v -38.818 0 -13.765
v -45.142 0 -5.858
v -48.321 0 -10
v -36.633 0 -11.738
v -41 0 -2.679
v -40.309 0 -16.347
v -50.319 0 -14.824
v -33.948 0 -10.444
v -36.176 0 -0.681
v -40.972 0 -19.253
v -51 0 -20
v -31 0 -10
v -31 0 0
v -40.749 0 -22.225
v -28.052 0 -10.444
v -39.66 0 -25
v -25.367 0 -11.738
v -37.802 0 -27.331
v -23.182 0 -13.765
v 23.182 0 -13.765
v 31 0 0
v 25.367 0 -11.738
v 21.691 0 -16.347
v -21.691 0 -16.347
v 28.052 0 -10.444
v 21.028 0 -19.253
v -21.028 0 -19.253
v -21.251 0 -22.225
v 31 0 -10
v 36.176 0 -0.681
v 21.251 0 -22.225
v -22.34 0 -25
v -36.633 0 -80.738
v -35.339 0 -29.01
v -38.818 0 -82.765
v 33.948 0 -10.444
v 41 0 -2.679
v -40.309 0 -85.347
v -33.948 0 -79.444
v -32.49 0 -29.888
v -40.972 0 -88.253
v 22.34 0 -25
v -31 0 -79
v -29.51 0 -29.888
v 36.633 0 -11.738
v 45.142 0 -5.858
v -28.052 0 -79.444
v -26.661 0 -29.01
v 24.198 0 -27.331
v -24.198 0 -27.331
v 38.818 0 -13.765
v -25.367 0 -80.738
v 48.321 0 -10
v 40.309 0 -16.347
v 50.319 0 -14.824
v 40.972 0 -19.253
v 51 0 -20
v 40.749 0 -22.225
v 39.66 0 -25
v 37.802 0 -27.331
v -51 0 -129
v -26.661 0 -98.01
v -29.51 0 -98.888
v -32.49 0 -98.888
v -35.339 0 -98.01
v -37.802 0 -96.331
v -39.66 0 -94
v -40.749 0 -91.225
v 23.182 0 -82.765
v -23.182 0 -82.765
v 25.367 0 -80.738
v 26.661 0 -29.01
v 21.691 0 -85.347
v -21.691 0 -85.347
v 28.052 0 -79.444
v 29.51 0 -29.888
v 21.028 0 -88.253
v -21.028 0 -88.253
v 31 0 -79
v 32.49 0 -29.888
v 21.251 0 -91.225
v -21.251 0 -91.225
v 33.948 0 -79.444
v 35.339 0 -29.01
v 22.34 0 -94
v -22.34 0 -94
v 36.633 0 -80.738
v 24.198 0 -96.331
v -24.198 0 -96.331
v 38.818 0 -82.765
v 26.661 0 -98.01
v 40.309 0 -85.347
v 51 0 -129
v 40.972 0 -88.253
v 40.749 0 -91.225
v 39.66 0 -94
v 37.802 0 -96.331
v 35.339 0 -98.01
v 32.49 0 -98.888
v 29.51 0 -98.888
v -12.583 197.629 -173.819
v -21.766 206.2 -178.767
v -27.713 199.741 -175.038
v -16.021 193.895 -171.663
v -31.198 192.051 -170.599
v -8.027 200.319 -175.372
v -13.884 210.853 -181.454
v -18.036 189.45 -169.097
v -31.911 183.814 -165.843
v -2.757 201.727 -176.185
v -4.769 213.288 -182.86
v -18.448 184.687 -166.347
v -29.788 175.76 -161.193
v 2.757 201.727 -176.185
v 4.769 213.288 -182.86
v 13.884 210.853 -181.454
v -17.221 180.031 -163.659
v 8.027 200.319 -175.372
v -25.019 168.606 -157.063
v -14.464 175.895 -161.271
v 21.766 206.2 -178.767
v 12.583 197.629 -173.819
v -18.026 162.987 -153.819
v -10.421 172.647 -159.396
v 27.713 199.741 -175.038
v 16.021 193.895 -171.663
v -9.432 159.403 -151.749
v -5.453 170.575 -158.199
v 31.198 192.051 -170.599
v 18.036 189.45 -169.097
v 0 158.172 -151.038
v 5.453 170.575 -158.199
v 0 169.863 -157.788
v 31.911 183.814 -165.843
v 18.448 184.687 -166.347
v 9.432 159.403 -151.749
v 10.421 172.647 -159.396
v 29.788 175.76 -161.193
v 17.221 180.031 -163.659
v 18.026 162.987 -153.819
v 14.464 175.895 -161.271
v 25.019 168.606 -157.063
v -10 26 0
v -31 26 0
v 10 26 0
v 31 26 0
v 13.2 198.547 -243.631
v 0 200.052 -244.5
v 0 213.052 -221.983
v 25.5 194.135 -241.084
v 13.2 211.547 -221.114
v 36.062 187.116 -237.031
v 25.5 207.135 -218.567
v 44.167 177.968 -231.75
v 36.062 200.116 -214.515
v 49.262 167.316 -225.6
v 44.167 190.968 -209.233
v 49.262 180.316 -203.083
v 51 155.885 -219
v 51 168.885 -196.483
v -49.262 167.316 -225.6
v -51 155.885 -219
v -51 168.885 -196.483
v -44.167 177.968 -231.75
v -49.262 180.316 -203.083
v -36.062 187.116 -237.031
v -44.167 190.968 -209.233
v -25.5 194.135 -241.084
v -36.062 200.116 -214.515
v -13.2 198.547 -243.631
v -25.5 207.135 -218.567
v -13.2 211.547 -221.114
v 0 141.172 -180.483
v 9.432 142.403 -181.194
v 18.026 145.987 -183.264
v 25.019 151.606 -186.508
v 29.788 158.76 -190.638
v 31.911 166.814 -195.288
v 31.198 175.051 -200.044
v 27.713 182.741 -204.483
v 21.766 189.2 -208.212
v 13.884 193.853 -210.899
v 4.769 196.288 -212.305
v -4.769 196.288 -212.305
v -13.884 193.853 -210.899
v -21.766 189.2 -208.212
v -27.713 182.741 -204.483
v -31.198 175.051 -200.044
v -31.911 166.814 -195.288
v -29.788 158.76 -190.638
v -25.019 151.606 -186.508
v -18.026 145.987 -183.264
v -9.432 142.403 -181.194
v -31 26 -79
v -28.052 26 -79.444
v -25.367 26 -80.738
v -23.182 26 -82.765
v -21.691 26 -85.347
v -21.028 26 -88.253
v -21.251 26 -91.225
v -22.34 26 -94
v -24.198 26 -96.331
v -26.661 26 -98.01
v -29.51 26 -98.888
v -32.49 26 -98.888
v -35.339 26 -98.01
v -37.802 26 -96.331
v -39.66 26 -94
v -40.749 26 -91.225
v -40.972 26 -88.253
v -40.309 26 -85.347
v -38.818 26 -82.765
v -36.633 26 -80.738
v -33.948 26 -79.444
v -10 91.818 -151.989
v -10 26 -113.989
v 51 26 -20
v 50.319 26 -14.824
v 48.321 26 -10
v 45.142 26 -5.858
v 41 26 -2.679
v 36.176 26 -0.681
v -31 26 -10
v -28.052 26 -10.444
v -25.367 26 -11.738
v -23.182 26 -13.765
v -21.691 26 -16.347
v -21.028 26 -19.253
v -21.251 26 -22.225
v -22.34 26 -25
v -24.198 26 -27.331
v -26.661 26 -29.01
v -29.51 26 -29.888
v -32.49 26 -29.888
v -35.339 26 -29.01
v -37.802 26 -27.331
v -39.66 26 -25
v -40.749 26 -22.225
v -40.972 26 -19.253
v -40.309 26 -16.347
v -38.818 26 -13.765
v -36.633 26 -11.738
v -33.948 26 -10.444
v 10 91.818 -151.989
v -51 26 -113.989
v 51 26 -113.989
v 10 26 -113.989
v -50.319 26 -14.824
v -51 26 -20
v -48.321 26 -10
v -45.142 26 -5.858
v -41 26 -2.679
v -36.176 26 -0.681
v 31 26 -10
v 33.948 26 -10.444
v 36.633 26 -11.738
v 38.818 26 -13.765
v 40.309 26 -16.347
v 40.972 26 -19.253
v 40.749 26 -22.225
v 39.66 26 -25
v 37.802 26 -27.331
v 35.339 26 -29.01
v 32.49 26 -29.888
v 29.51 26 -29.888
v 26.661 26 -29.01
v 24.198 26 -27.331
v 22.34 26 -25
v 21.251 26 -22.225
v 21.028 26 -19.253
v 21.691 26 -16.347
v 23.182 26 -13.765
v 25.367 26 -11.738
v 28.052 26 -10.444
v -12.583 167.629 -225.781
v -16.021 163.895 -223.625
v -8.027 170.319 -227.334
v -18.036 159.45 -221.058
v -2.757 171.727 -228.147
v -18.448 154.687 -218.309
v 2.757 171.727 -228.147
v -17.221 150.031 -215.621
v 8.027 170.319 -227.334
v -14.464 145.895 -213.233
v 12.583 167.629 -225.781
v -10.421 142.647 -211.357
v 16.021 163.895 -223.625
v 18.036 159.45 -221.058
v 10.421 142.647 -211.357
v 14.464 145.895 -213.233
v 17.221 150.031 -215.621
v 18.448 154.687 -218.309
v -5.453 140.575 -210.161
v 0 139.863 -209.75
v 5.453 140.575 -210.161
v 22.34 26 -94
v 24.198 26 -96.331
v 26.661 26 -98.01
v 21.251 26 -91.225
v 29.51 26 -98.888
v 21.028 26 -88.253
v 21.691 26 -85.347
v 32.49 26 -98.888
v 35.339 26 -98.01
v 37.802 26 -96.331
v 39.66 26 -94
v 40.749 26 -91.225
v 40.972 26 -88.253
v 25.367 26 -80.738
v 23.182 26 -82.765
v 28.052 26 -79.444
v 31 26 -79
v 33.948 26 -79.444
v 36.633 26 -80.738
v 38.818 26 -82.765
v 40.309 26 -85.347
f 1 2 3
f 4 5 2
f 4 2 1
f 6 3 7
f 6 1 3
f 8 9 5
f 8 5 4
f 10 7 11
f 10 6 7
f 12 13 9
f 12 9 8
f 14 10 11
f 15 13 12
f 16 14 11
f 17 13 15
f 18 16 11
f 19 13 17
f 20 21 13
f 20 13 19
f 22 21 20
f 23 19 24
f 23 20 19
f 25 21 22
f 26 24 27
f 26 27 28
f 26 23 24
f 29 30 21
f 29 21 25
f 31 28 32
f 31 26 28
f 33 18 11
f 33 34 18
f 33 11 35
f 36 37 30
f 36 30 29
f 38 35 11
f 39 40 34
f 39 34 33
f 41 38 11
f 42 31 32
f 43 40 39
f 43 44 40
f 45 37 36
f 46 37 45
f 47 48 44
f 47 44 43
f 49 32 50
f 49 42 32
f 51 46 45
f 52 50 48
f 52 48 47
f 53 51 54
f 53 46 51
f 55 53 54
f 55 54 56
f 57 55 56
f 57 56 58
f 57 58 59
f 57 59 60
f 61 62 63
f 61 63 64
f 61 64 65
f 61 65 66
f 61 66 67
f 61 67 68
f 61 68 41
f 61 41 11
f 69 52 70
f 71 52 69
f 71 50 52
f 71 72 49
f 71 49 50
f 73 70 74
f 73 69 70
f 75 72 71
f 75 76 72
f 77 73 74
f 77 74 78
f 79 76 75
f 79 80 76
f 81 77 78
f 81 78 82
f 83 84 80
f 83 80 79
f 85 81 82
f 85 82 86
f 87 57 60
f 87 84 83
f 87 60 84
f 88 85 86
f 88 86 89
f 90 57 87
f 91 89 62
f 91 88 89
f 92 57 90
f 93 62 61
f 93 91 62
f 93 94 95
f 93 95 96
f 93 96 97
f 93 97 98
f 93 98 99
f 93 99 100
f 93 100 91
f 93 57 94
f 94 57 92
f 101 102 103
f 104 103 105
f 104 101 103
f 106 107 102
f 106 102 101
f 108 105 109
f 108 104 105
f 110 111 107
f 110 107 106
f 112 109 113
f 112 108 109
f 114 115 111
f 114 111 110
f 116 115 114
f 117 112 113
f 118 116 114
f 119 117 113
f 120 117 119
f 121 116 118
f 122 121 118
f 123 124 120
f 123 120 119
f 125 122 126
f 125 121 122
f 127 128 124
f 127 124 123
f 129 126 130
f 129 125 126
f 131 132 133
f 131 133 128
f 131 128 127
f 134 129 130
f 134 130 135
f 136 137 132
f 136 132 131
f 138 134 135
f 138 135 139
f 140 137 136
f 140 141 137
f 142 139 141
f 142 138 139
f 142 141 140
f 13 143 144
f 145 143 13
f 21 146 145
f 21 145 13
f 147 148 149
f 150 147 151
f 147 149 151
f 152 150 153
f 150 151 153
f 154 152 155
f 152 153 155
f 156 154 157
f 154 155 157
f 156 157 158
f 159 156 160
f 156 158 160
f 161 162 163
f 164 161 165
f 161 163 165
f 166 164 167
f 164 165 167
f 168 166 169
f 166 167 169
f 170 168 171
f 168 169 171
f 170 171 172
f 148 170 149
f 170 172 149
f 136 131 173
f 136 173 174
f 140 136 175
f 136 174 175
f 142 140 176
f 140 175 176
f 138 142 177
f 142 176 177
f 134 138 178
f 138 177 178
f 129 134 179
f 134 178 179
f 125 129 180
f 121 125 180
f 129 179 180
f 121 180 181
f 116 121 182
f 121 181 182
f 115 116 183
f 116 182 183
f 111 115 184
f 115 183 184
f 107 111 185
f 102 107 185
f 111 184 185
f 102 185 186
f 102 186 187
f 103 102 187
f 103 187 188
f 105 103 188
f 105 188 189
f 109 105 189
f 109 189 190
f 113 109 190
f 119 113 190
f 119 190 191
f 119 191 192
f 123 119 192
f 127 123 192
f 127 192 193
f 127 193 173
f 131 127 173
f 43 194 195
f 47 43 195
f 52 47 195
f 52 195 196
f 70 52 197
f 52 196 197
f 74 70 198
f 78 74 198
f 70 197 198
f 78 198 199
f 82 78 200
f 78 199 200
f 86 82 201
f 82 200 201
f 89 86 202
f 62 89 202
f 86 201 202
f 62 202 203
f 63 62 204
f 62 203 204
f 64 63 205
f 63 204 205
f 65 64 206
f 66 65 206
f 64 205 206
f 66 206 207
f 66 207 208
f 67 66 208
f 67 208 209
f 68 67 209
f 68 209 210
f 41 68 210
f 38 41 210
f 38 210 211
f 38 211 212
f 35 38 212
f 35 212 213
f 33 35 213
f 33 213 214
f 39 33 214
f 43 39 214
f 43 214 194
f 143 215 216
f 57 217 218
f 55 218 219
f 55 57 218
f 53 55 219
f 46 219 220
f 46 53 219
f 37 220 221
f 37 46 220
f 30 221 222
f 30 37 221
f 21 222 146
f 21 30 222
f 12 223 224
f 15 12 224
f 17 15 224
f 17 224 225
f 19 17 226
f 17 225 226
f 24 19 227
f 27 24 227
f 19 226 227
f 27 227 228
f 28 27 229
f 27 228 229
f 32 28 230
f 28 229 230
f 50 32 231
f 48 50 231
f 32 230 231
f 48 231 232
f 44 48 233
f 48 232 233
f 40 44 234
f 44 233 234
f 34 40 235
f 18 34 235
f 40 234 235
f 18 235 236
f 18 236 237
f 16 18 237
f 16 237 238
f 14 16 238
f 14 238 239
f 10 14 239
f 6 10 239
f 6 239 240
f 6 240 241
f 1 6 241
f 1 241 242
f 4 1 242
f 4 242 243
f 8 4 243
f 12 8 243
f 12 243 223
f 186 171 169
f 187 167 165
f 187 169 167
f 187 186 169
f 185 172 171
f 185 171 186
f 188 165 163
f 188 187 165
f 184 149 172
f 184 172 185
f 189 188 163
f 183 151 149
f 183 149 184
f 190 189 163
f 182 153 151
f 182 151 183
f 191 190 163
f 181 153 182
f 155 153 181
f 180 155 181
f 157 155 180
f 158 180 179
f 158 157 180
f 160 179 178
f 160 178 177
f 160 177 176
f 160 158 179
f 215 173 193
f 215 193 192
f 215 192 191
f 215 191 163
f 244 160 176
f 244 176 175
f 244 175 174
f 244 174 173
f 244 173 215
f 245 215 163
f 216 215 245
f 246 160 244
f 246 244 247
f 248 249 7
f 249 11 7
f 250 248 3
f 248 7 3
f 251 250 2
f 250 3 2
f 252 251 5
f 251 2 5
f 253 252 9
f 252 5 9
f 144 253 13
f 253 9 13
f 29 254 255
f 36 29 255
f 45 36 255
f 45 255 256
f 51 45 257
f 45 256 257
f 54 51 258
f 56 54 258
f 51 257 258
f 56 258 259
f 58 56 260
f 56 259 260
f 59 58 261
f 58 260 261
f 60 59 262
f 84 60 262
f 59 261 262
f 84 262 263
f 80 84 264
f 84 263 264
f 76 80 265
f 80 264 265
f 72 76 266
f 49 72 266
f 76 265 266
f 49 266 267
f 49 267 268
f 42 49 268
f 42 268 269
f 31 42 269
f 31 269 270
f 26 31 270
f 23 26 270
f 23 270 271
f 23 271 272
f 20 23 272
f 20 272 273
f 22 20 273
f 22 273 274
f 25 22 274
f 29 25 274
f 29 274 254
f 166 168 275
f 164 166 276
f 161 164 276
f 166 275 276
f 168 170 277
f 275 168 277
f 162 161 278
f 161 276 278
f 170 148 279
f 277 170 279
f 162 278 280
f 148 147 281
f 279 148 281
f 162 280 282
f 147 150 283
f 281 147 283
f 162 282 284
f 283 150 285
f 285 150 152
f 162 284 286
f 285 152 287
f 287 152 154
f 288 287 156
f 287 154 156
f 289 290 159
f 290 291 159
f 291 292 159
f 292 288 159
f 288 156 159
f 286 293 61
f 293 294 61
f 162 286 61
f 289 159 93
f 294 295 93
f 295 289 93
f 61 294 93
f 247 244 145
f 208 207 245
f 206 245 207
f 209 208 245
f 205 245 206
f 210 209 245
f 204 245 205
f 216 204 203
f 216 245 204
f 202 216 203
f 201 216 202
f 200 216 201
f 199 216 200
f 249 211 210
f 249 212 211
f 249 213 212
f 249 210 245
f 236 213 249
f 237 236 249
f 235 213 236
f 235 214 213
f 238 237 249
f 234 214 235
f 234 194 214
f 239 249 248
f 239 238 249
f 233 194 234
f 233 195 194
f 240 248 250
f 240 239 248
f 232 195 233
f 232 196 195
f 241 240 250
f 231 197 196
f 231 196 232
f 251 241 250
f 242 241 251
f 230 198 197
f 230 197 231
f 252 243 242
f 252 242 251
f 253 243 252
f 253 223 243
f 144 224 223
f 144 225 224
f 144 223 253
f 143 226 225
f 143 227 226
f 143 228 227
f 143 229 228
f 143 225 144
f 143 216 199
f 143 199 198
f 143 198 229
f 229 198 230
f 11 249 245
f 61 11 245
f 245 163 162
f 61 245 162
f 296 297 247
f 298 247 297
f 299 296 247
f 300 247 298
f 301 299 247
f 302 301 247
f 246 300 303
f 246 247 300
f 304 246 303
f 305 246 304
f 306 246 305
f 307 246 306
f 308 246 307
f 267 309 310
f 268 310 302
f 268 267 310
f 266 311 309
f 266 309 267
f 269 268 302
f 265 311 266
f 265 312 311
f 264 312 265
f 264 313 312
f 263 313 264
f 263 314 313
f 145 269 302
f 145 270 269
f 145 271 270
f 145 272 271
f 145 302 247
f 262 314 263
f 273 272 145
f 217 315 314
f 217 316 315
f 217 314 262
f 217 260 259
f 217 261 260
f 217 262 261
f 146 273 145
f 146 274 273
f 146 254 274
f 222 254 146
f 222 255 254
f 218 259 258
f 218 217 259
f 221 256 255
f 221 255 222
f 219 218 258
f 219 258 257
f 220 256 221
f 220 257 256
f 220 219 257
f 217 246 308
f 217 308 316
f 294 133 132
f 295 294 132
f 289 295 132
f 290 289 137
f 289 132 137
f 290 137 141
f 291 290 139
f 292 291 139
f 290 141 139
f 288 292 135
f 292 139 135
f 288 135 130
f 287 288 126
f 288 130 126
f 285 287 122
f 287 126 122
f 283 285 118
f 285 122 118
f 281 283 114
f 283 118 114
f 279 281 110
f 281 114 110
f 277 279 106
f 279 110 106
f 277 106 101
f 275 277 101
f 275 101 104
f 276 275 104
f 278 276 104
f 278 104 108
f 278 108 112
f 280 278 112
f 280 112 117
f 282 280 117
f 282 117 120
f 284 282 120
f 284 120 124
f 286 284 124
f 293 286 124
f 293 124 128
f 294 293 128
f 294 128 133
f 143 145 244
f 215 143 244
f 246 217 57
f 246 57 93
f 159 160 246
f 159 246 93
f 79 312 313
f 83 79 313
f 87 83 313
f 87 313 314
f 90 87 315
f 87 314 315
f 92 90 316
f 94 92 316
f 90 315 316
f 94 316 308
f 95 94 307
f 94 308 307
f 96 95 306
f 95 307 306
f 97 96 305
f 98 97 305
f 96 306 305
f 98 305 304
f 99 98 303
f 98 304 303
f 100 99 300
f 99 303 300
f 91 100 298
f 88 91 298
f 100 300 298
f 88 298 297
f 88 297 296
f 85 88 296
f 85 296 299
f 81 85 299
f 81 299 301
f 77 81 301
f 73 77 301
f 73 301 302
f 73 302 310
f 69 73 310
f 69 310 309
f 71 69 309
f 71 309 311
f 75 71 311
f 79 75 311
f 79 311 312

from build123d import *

# Parameters (mm, degrees)
BOSS_EXTRUDE1_DEPTH = 51
CUT_EXTRUDE1_DEPTH  = 102
BOSS_EXTRUDE2_START = -26
SKETCH4_R           = 32
BOSS_EXTRUDE2_DEPTH = 60
SKETCH5_R           = 18.5
CUT_EXTRUDE2_DEPTH  = 316.950756304
BOSS_EXTRUDE3_DEPTH = 10
SKETCH7_R           = 10
CUT_EXTRUDE3_DEPTH  = 313.368418834
FILLET1_R           = 20


with BuildPart() as part:
    # Sketch2 → Boss-Extrude1 (new, symmetric)
    with BuildSketch(Plane(origin=(0, 0, 0), x_dir=(0, 0, -1), z_dir=(1, 0, 0))):
        Polygon((0, 0), (54.31624891, 0), (129, 0), (244.5, 200.051868274), (221.983339502, 213.051868274), (113.988893001, 26), (0, 26), align=None)
    extrude(amount=BOSS_EXTRUDE1_DEPTH, both=True)

    # Sketch3 → Cut-Extrude1 (cut)
    with BuildSketch(Plane(origin=(0, -42.858638544, -74.233339502), x_dir=(1, 0, 0), z_dir=(0, 0.49999999999999784, 0.86602540378444))):
        with BuildLine():
            Line((-51, 295.5), (-51, 244.5))
            ThreePointArc((-51, 244.5), (-36.062445841, 280.562445841), (0, 295.5))
            Line((0, 295.5), (-51, 295.5))
        make_face()
        with BuildLine():
            Line((51, 295.5), (0, 295.5))
            ThreePointArc((0, 295.5), (36.062445841, 280.562445841), (51, 244.5))
            Line((51, 244.5), (51, 295.5))
        make_face()
    extrude(amount=-CUT_EXTRUDE1_DEPTH, mode=Mode.SUBTRACT)

    # Sketch4 → Boss-Extrude2 (add)
    with BuildSketch(Plane(origin=(0, -42.858638544, -74.233339502), x_dir=(1, 0, 0), z_dir=(0, 0.49999999999999784, 0.86602540378444)).offset(BOSS_EXTRUDE2_START)):
        with Locations(Location((0, 244.5, 0), (0, 0, 270))):
            Circle(SKETCH4_R)
    extrude(amount=BOSS_EXTRUDE2_DEPTH)

    # Sketch5 → Cut-Extrude2 (cut, through all)
    with BuildSketch(Plane(origin=(0, -25.858638544, -44.788475772), x_dir=(1, 0, 0), z_dir=(0, 0.49999999999999784, 0.86602540378444))):
        with Locations(Location((0, 244.5, 0), (0, 0, 270))):
            Circle(SKETCH5_R)
    extrude(amount=-CUT_EXTRUDE2_DEPTH, mode=Mode.SUBTRACT)

    # Sketch6 → Boss-Extrude3 (add, symmetric)
    with BuildSketch(Plane(origin=(0, 0, 0), x_dir=(0, 0, -1), z_dir=(1, 0, 0))):
        Polygon((0, 26), (151.988893001, 91.817930688), (113.988893001, 26), align=None)
    extrude(amount=BOSS_EXTRUDE3_DEPTH, both=True)

    # Sketch7 → Cut-Extrude3 (cut, through all)
    with BuildSketch(Plane(origin=(0, 26, 0), x_dir=(1, 0, 0), z_dir=(0, 1, 0))):
        with Locations(Location((31, 20, 0), (0, 0, 270))):
            Circle(SKETCH7_R)
        with Locations(Location((-31, 20, 0), (0, 0, 270))):
            Circle(SKETCH7_R)
        with Locations(Location((-31, 89, 0), (0, 0, 270))):
            Circle(SKETCH7_R)
        with Locations(Location((31, 89, 0), (0, 0, 270))):
            Circle(SKETCH7_R)
    extrude(amount=-CUT_EXTRUDE3_DEPTH, mode=Mode.SUBTRACT)

    # Fillet1
    fillet1_edges = [part.edges().sort_by_distance(p)[0] for p in [
        (51, 13, 0),
        (-51, 13, 0),
    ]]
    fillet(fillet1_edges, radius=FILLET1_R)


solid = part.part
